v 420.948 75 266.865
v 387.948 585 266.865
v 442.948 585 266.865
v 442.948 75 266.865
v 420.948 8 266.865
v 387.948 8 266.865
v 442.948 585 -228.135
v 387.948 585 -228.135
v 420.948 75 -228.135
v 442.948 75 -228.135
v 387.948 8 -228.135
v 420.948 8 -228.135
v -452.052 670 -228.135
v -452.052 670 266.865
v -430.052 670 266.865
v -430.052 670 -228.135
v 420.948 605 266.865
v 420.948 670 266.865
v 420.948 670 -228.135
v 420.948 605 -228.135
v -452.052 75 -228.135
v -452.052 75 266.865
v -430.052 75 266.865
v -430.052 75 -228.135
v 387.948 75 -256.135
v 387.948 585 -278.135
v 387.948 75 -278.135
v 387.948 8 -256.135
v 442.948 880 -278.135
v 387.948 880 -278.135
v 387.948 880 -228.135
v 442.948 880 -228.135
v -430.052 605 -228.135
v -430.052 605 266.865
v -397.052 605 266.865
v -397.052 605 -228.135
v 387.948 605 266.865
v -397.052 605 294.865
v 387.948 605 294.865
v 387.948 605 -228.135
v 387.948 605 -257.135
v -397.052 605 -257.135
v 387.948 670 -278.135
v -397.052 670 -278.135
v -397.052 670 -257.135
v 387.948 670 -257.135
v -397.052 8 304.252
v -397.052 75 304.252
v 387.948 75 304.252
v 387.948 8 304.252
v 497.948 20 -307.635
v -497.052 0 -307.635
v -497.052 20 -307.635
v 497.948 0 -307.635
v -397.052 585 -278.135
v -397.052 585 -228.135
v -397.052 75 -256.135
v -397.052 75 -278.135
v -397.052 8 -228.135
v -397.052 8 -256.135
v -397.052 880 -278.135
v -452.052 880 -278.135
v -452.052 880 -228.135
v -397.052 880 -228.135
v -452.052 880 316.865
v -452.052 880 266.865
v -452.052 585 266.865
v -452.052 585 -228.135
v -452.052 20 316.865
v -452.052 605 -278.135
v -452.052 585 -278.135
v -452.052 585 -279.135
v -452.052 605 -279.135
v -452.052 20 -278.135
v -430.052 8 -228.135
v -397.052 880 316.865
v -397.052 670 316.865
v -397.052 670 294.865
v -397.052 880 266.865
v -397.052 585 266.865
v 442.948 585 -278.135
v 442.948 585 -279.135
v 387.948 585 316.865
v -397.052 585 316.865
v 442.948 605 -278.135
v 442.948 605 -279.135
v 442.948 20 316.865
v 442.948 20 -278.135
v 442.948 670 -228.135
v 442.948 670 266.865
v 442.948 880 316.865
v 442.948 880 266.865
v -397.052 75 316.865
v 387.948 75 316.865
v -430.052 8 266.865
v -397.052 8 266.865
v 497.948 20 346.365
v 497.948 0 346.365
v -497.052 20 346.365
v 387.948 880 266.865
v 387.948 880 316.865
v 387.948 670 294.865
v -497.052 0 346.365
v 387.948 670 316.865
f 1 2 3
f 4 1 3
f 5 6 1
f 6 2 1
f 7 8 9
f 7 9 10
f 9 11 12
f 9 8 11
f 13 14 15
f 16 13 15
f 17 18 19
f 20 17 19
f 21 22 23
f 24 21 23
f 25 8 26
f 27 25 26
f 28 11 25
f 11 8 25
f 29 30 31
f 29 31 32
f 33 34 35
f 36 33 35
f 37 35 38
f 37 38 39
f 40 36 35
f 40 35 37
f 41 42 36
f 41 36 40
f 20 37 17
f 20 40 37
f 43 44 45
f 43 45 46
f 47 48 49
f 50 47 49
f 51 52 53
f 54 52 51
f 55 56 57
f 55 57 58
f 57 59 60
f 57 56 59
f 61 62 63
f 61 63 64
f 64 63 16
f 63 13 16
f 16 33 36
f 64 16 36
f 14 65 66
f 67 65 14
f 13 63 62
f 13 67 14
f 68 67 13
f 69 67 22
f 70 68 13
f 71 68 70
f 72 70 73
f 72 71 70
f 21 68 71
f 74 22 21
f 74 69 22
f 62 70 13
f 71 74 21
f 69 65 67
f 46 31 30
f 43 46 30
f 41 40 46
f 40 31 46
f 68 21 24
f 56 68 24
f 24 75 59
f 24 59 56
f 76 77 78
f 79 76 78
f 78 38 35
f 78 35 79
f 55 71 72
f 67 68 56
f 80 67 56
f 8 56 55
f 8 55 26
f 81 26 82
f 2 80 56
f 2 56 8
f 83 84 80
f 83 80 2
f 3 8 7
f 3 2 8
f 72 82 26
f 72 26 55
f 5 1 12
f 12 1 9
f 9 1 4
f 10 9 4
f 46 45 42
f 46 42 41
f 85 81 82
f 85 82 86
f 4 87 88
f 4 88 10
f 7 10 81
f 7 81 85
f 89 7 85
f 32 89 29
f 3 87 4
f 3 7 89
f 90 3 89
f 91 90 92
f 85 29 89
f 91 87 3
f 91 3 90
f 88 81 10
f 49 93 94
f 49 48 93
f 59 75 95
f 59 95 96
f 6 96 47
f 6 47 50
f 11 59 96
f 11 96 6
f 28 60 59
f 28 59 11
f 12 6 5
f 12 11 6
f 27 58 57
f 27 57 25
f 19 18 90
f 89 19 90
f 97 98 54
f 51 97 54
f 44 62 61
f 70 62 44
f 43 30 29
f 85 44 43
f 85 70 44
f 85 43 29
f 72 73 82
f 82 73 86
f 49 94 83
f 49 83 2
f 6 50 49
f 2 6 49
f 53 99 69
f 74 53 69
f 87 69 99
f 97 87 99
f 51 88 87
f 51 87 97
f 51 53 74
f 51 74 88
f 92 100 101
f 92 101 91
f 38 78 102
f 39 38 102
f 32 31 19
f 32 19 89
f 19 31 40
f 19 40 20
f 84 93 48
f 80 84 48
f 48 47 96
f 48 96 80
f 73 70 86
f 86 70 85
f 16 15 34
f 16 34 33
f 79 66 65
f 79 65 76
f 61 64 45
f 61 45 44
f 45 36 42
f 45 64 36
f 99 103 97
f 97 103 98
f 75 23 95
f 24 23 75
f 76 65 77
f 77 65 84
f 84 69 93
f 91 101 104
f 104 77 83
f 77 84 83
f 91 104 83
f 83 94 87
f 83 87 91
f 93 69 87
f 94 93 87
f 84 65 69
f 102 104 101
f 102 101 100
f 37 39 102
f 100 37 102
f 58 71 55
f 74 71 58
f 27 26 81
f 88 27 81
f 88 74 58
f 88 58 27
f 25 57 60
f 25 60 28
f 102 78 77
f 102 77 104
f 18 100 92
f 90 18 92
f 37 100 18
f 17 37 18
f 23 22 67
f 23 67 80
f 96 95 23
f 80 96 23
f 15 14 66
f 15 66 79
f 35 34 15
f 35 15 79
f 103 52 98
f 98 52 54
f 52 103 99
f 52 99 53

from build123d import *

# Parameters (mm, degrees)
CROQUIS2_W              = 995
CROQUIS2_H              = 654
SALIENTE_EXTRUIR1_DEPTH = 20
CROQUIS4_W              = 895
CROQUIS4_H              = 595
SALIENTE_EXTRUIR2_DEPTH = 75
CROQUIS6_W              = 851
CROQUIS6_H              = 560.386984293
CORTAR_EXTRUIR1_DEPTH   = 67
CROQUIS7_W              = 55
CROQUIS7_H              = 50
SALIENTE_EXTRUIR3_DEPTH = 880
CROQUIS9_W              = 55
CROQUIS9_H              = 50
SALIENTE_EXTRUIR5_DEPTH = 880
CROQUIS10_W             = 55
CROQUIS10_H             = 50
SALIENTE_EXTRUIR6_DEPTH = 880
CROQUIS11_W             = 55
CROQUIS11_H             = 50
SALIENTE_EXTRUIR7_DEPTH = 880
CROQUIS14_W             = 895
CROQUIS14_H             = 20
EXTRUIR_L_MINA4_DEPTH   = 596
CROQUIS22_W             = 895
CROQUIS22_H             = 595
SALIENTE_EXTRUIR8_DEPTH = 65
CROQUIS25_W             = 851
CROQUIS25_H             = 495
CORTAR_EXTRUIR2_DEPTH   = 65
CROQUIS26_W             = 785
CROQUIS26_H             = 552
CORTAR_EXTRUIR3_DEPTH   = 65


with BuildPart() as part:
    # Croquis2 → Saliente-Extruir1 (new body)
    with BuildSketch(Plane(origin=(0, 0, 0), x_dir=(1, 0, 0), z_dir=(0, 1, 0))):
        with Locations((0.447794779, -19.364986499)):
            Rectangle(CROQUIS2_W, CROQUIS2_H)
    extrude(amount=SALIENTE_EXTRUIR1_DEPTH)

    # Croquis4 → Saliente-Extruir2 (add)
    with BuildSketch(Plane(origin=(0, 0, 0), x_dir=(1, 0, 0), z_dir=(0, 1, 0))):
        with Locations((-4.552205221, -19.364986499)):
            Rectangle(CROQUIS4_W, CROQUIS4_H)
    extrude(amount=SALIENTE_EXTRUIR2_DEPTH)

    # Croquis6 → Cortar-Extruir1 (cut)
    with BuildSketch(Plane(origin=(0, 75, 0), x_dir=(1, 0, 0), z_dir=(0, 1, 0))):
        with Locations((-4.552205221, -24.058478646)):
            Rectangle(CROQUIS6_W, CROQUIS6_H)
    extrude(amount=-CORTAR_EXTRUIR1_DEPTH, mode=Mode.SUBTRACT)

    # Croquis7 → Saliente-Extruir3 (add)
    with BuildSketch(Plane(origin=(0, 0, 0), x_dir=(1, 0, 0), z_dir=(0, 1, 0))):
        with Locations((-424.552205221, -291.864986499)):
            Rectangle(CROQUIS7_W, CROQUIS7_H)
    extrude(amount=SALIENTE_EXTRUIR3_DEPTH)

    # Croquis9 → Saliente-Extruir5 (add)
    with BuildSketch(Plane(origin=(0, 0, 0), x_dir=(1, 0, 0), z_dir=(0, 1, 0))):
        with Locations((-424.552205221, 253.135013501)):
            Rectangle(CROQUIS9_W, CROQUIS9_H)
    extrude(amount=SALIENTE_EXTRUIR5_DEPTH)

    # Croquis10 → Saliente-Extruir6 (add)
    with BuildSketch(Plane(origin=(0, 0, 0), x_dir=(1, 0, 0), z_dir=(0, 1, 0))):
        with Locations((415.447794779, 253.135013501)):
            Rectangle(CROQUIS10_W, CROQUIS10_H)
    extrude(amount=SALIENTE_EXTRUIR6_DEPTH)

    # Croquis11 → Saliente-Extruir7 (add)
    with BuildSketch(Plane(origin=(0, 0, 0), x_dir=(1, 0, 0), z_dir=(0, 1, 0))):
        with Locations((415.447794779, -291.864986499)):
            Rectangle(CROQUIS11_W, CROQUIS11_H)
    extrude(amount=SALIENTE_EXTRUIR7_DEPTH)

    # Croquis14 → Extruir-Lámina4 (add)
    with BuildSketch(Plane.XY.offset(316.864986499)):
        with Locations((-4.552205221, 595)):
            Rectangle(CROQUIS14_W, CROQUIS14_H)
    extrude(amount=-EXTRUIR_L_MINA4_DEPTH)

    # Croquis22 → Saliente-Extruir8 (add)
    with BuildSketch(Plane(origin=(0, 605, 0), x_dir=(1, 0, 0), z_dir=(0, 1, 0))):
        with Locations((-4.552205221, -19.364986499)):
            Rectangle(CROQUIS22_W, CROQUIS22_H)
    extrude(amount=SALIENTE_EXTRUIR8_DEPTH)

    # Croquis25 → Cortar-Extruir2 (cut)
    with BuildSketch(Plane(origin=(0, 670, 0), x_dir=(1, 0, 0), z_dir=(0, 1, 0))):
        with Locations((-4.552205221, -19.364986499)):
            Rectangle(CROQUIS25_W, CROQUIS25_H)
    extrude(amount=-CORTAR_EXTRUIR2_DEPTH, mode=Mode.SUBTRACT)

    # Croquis26 → Cortar-Extruir3 (cut)
    with BuildSketch(Plane(origin=(0, 670, 0), x_dir=(1, 0, 0), z_dir=(0, 1, 0))):
        with Locations((-4.552205221, -18.864986499)):
            Rectangle(CROQUIS26_W, CROQUIS26_H)
    extrude(amount=-CORTAR_EXTRUIR3_DEPTH, mode=Mode.SUBTRACT)


solid = part.part
